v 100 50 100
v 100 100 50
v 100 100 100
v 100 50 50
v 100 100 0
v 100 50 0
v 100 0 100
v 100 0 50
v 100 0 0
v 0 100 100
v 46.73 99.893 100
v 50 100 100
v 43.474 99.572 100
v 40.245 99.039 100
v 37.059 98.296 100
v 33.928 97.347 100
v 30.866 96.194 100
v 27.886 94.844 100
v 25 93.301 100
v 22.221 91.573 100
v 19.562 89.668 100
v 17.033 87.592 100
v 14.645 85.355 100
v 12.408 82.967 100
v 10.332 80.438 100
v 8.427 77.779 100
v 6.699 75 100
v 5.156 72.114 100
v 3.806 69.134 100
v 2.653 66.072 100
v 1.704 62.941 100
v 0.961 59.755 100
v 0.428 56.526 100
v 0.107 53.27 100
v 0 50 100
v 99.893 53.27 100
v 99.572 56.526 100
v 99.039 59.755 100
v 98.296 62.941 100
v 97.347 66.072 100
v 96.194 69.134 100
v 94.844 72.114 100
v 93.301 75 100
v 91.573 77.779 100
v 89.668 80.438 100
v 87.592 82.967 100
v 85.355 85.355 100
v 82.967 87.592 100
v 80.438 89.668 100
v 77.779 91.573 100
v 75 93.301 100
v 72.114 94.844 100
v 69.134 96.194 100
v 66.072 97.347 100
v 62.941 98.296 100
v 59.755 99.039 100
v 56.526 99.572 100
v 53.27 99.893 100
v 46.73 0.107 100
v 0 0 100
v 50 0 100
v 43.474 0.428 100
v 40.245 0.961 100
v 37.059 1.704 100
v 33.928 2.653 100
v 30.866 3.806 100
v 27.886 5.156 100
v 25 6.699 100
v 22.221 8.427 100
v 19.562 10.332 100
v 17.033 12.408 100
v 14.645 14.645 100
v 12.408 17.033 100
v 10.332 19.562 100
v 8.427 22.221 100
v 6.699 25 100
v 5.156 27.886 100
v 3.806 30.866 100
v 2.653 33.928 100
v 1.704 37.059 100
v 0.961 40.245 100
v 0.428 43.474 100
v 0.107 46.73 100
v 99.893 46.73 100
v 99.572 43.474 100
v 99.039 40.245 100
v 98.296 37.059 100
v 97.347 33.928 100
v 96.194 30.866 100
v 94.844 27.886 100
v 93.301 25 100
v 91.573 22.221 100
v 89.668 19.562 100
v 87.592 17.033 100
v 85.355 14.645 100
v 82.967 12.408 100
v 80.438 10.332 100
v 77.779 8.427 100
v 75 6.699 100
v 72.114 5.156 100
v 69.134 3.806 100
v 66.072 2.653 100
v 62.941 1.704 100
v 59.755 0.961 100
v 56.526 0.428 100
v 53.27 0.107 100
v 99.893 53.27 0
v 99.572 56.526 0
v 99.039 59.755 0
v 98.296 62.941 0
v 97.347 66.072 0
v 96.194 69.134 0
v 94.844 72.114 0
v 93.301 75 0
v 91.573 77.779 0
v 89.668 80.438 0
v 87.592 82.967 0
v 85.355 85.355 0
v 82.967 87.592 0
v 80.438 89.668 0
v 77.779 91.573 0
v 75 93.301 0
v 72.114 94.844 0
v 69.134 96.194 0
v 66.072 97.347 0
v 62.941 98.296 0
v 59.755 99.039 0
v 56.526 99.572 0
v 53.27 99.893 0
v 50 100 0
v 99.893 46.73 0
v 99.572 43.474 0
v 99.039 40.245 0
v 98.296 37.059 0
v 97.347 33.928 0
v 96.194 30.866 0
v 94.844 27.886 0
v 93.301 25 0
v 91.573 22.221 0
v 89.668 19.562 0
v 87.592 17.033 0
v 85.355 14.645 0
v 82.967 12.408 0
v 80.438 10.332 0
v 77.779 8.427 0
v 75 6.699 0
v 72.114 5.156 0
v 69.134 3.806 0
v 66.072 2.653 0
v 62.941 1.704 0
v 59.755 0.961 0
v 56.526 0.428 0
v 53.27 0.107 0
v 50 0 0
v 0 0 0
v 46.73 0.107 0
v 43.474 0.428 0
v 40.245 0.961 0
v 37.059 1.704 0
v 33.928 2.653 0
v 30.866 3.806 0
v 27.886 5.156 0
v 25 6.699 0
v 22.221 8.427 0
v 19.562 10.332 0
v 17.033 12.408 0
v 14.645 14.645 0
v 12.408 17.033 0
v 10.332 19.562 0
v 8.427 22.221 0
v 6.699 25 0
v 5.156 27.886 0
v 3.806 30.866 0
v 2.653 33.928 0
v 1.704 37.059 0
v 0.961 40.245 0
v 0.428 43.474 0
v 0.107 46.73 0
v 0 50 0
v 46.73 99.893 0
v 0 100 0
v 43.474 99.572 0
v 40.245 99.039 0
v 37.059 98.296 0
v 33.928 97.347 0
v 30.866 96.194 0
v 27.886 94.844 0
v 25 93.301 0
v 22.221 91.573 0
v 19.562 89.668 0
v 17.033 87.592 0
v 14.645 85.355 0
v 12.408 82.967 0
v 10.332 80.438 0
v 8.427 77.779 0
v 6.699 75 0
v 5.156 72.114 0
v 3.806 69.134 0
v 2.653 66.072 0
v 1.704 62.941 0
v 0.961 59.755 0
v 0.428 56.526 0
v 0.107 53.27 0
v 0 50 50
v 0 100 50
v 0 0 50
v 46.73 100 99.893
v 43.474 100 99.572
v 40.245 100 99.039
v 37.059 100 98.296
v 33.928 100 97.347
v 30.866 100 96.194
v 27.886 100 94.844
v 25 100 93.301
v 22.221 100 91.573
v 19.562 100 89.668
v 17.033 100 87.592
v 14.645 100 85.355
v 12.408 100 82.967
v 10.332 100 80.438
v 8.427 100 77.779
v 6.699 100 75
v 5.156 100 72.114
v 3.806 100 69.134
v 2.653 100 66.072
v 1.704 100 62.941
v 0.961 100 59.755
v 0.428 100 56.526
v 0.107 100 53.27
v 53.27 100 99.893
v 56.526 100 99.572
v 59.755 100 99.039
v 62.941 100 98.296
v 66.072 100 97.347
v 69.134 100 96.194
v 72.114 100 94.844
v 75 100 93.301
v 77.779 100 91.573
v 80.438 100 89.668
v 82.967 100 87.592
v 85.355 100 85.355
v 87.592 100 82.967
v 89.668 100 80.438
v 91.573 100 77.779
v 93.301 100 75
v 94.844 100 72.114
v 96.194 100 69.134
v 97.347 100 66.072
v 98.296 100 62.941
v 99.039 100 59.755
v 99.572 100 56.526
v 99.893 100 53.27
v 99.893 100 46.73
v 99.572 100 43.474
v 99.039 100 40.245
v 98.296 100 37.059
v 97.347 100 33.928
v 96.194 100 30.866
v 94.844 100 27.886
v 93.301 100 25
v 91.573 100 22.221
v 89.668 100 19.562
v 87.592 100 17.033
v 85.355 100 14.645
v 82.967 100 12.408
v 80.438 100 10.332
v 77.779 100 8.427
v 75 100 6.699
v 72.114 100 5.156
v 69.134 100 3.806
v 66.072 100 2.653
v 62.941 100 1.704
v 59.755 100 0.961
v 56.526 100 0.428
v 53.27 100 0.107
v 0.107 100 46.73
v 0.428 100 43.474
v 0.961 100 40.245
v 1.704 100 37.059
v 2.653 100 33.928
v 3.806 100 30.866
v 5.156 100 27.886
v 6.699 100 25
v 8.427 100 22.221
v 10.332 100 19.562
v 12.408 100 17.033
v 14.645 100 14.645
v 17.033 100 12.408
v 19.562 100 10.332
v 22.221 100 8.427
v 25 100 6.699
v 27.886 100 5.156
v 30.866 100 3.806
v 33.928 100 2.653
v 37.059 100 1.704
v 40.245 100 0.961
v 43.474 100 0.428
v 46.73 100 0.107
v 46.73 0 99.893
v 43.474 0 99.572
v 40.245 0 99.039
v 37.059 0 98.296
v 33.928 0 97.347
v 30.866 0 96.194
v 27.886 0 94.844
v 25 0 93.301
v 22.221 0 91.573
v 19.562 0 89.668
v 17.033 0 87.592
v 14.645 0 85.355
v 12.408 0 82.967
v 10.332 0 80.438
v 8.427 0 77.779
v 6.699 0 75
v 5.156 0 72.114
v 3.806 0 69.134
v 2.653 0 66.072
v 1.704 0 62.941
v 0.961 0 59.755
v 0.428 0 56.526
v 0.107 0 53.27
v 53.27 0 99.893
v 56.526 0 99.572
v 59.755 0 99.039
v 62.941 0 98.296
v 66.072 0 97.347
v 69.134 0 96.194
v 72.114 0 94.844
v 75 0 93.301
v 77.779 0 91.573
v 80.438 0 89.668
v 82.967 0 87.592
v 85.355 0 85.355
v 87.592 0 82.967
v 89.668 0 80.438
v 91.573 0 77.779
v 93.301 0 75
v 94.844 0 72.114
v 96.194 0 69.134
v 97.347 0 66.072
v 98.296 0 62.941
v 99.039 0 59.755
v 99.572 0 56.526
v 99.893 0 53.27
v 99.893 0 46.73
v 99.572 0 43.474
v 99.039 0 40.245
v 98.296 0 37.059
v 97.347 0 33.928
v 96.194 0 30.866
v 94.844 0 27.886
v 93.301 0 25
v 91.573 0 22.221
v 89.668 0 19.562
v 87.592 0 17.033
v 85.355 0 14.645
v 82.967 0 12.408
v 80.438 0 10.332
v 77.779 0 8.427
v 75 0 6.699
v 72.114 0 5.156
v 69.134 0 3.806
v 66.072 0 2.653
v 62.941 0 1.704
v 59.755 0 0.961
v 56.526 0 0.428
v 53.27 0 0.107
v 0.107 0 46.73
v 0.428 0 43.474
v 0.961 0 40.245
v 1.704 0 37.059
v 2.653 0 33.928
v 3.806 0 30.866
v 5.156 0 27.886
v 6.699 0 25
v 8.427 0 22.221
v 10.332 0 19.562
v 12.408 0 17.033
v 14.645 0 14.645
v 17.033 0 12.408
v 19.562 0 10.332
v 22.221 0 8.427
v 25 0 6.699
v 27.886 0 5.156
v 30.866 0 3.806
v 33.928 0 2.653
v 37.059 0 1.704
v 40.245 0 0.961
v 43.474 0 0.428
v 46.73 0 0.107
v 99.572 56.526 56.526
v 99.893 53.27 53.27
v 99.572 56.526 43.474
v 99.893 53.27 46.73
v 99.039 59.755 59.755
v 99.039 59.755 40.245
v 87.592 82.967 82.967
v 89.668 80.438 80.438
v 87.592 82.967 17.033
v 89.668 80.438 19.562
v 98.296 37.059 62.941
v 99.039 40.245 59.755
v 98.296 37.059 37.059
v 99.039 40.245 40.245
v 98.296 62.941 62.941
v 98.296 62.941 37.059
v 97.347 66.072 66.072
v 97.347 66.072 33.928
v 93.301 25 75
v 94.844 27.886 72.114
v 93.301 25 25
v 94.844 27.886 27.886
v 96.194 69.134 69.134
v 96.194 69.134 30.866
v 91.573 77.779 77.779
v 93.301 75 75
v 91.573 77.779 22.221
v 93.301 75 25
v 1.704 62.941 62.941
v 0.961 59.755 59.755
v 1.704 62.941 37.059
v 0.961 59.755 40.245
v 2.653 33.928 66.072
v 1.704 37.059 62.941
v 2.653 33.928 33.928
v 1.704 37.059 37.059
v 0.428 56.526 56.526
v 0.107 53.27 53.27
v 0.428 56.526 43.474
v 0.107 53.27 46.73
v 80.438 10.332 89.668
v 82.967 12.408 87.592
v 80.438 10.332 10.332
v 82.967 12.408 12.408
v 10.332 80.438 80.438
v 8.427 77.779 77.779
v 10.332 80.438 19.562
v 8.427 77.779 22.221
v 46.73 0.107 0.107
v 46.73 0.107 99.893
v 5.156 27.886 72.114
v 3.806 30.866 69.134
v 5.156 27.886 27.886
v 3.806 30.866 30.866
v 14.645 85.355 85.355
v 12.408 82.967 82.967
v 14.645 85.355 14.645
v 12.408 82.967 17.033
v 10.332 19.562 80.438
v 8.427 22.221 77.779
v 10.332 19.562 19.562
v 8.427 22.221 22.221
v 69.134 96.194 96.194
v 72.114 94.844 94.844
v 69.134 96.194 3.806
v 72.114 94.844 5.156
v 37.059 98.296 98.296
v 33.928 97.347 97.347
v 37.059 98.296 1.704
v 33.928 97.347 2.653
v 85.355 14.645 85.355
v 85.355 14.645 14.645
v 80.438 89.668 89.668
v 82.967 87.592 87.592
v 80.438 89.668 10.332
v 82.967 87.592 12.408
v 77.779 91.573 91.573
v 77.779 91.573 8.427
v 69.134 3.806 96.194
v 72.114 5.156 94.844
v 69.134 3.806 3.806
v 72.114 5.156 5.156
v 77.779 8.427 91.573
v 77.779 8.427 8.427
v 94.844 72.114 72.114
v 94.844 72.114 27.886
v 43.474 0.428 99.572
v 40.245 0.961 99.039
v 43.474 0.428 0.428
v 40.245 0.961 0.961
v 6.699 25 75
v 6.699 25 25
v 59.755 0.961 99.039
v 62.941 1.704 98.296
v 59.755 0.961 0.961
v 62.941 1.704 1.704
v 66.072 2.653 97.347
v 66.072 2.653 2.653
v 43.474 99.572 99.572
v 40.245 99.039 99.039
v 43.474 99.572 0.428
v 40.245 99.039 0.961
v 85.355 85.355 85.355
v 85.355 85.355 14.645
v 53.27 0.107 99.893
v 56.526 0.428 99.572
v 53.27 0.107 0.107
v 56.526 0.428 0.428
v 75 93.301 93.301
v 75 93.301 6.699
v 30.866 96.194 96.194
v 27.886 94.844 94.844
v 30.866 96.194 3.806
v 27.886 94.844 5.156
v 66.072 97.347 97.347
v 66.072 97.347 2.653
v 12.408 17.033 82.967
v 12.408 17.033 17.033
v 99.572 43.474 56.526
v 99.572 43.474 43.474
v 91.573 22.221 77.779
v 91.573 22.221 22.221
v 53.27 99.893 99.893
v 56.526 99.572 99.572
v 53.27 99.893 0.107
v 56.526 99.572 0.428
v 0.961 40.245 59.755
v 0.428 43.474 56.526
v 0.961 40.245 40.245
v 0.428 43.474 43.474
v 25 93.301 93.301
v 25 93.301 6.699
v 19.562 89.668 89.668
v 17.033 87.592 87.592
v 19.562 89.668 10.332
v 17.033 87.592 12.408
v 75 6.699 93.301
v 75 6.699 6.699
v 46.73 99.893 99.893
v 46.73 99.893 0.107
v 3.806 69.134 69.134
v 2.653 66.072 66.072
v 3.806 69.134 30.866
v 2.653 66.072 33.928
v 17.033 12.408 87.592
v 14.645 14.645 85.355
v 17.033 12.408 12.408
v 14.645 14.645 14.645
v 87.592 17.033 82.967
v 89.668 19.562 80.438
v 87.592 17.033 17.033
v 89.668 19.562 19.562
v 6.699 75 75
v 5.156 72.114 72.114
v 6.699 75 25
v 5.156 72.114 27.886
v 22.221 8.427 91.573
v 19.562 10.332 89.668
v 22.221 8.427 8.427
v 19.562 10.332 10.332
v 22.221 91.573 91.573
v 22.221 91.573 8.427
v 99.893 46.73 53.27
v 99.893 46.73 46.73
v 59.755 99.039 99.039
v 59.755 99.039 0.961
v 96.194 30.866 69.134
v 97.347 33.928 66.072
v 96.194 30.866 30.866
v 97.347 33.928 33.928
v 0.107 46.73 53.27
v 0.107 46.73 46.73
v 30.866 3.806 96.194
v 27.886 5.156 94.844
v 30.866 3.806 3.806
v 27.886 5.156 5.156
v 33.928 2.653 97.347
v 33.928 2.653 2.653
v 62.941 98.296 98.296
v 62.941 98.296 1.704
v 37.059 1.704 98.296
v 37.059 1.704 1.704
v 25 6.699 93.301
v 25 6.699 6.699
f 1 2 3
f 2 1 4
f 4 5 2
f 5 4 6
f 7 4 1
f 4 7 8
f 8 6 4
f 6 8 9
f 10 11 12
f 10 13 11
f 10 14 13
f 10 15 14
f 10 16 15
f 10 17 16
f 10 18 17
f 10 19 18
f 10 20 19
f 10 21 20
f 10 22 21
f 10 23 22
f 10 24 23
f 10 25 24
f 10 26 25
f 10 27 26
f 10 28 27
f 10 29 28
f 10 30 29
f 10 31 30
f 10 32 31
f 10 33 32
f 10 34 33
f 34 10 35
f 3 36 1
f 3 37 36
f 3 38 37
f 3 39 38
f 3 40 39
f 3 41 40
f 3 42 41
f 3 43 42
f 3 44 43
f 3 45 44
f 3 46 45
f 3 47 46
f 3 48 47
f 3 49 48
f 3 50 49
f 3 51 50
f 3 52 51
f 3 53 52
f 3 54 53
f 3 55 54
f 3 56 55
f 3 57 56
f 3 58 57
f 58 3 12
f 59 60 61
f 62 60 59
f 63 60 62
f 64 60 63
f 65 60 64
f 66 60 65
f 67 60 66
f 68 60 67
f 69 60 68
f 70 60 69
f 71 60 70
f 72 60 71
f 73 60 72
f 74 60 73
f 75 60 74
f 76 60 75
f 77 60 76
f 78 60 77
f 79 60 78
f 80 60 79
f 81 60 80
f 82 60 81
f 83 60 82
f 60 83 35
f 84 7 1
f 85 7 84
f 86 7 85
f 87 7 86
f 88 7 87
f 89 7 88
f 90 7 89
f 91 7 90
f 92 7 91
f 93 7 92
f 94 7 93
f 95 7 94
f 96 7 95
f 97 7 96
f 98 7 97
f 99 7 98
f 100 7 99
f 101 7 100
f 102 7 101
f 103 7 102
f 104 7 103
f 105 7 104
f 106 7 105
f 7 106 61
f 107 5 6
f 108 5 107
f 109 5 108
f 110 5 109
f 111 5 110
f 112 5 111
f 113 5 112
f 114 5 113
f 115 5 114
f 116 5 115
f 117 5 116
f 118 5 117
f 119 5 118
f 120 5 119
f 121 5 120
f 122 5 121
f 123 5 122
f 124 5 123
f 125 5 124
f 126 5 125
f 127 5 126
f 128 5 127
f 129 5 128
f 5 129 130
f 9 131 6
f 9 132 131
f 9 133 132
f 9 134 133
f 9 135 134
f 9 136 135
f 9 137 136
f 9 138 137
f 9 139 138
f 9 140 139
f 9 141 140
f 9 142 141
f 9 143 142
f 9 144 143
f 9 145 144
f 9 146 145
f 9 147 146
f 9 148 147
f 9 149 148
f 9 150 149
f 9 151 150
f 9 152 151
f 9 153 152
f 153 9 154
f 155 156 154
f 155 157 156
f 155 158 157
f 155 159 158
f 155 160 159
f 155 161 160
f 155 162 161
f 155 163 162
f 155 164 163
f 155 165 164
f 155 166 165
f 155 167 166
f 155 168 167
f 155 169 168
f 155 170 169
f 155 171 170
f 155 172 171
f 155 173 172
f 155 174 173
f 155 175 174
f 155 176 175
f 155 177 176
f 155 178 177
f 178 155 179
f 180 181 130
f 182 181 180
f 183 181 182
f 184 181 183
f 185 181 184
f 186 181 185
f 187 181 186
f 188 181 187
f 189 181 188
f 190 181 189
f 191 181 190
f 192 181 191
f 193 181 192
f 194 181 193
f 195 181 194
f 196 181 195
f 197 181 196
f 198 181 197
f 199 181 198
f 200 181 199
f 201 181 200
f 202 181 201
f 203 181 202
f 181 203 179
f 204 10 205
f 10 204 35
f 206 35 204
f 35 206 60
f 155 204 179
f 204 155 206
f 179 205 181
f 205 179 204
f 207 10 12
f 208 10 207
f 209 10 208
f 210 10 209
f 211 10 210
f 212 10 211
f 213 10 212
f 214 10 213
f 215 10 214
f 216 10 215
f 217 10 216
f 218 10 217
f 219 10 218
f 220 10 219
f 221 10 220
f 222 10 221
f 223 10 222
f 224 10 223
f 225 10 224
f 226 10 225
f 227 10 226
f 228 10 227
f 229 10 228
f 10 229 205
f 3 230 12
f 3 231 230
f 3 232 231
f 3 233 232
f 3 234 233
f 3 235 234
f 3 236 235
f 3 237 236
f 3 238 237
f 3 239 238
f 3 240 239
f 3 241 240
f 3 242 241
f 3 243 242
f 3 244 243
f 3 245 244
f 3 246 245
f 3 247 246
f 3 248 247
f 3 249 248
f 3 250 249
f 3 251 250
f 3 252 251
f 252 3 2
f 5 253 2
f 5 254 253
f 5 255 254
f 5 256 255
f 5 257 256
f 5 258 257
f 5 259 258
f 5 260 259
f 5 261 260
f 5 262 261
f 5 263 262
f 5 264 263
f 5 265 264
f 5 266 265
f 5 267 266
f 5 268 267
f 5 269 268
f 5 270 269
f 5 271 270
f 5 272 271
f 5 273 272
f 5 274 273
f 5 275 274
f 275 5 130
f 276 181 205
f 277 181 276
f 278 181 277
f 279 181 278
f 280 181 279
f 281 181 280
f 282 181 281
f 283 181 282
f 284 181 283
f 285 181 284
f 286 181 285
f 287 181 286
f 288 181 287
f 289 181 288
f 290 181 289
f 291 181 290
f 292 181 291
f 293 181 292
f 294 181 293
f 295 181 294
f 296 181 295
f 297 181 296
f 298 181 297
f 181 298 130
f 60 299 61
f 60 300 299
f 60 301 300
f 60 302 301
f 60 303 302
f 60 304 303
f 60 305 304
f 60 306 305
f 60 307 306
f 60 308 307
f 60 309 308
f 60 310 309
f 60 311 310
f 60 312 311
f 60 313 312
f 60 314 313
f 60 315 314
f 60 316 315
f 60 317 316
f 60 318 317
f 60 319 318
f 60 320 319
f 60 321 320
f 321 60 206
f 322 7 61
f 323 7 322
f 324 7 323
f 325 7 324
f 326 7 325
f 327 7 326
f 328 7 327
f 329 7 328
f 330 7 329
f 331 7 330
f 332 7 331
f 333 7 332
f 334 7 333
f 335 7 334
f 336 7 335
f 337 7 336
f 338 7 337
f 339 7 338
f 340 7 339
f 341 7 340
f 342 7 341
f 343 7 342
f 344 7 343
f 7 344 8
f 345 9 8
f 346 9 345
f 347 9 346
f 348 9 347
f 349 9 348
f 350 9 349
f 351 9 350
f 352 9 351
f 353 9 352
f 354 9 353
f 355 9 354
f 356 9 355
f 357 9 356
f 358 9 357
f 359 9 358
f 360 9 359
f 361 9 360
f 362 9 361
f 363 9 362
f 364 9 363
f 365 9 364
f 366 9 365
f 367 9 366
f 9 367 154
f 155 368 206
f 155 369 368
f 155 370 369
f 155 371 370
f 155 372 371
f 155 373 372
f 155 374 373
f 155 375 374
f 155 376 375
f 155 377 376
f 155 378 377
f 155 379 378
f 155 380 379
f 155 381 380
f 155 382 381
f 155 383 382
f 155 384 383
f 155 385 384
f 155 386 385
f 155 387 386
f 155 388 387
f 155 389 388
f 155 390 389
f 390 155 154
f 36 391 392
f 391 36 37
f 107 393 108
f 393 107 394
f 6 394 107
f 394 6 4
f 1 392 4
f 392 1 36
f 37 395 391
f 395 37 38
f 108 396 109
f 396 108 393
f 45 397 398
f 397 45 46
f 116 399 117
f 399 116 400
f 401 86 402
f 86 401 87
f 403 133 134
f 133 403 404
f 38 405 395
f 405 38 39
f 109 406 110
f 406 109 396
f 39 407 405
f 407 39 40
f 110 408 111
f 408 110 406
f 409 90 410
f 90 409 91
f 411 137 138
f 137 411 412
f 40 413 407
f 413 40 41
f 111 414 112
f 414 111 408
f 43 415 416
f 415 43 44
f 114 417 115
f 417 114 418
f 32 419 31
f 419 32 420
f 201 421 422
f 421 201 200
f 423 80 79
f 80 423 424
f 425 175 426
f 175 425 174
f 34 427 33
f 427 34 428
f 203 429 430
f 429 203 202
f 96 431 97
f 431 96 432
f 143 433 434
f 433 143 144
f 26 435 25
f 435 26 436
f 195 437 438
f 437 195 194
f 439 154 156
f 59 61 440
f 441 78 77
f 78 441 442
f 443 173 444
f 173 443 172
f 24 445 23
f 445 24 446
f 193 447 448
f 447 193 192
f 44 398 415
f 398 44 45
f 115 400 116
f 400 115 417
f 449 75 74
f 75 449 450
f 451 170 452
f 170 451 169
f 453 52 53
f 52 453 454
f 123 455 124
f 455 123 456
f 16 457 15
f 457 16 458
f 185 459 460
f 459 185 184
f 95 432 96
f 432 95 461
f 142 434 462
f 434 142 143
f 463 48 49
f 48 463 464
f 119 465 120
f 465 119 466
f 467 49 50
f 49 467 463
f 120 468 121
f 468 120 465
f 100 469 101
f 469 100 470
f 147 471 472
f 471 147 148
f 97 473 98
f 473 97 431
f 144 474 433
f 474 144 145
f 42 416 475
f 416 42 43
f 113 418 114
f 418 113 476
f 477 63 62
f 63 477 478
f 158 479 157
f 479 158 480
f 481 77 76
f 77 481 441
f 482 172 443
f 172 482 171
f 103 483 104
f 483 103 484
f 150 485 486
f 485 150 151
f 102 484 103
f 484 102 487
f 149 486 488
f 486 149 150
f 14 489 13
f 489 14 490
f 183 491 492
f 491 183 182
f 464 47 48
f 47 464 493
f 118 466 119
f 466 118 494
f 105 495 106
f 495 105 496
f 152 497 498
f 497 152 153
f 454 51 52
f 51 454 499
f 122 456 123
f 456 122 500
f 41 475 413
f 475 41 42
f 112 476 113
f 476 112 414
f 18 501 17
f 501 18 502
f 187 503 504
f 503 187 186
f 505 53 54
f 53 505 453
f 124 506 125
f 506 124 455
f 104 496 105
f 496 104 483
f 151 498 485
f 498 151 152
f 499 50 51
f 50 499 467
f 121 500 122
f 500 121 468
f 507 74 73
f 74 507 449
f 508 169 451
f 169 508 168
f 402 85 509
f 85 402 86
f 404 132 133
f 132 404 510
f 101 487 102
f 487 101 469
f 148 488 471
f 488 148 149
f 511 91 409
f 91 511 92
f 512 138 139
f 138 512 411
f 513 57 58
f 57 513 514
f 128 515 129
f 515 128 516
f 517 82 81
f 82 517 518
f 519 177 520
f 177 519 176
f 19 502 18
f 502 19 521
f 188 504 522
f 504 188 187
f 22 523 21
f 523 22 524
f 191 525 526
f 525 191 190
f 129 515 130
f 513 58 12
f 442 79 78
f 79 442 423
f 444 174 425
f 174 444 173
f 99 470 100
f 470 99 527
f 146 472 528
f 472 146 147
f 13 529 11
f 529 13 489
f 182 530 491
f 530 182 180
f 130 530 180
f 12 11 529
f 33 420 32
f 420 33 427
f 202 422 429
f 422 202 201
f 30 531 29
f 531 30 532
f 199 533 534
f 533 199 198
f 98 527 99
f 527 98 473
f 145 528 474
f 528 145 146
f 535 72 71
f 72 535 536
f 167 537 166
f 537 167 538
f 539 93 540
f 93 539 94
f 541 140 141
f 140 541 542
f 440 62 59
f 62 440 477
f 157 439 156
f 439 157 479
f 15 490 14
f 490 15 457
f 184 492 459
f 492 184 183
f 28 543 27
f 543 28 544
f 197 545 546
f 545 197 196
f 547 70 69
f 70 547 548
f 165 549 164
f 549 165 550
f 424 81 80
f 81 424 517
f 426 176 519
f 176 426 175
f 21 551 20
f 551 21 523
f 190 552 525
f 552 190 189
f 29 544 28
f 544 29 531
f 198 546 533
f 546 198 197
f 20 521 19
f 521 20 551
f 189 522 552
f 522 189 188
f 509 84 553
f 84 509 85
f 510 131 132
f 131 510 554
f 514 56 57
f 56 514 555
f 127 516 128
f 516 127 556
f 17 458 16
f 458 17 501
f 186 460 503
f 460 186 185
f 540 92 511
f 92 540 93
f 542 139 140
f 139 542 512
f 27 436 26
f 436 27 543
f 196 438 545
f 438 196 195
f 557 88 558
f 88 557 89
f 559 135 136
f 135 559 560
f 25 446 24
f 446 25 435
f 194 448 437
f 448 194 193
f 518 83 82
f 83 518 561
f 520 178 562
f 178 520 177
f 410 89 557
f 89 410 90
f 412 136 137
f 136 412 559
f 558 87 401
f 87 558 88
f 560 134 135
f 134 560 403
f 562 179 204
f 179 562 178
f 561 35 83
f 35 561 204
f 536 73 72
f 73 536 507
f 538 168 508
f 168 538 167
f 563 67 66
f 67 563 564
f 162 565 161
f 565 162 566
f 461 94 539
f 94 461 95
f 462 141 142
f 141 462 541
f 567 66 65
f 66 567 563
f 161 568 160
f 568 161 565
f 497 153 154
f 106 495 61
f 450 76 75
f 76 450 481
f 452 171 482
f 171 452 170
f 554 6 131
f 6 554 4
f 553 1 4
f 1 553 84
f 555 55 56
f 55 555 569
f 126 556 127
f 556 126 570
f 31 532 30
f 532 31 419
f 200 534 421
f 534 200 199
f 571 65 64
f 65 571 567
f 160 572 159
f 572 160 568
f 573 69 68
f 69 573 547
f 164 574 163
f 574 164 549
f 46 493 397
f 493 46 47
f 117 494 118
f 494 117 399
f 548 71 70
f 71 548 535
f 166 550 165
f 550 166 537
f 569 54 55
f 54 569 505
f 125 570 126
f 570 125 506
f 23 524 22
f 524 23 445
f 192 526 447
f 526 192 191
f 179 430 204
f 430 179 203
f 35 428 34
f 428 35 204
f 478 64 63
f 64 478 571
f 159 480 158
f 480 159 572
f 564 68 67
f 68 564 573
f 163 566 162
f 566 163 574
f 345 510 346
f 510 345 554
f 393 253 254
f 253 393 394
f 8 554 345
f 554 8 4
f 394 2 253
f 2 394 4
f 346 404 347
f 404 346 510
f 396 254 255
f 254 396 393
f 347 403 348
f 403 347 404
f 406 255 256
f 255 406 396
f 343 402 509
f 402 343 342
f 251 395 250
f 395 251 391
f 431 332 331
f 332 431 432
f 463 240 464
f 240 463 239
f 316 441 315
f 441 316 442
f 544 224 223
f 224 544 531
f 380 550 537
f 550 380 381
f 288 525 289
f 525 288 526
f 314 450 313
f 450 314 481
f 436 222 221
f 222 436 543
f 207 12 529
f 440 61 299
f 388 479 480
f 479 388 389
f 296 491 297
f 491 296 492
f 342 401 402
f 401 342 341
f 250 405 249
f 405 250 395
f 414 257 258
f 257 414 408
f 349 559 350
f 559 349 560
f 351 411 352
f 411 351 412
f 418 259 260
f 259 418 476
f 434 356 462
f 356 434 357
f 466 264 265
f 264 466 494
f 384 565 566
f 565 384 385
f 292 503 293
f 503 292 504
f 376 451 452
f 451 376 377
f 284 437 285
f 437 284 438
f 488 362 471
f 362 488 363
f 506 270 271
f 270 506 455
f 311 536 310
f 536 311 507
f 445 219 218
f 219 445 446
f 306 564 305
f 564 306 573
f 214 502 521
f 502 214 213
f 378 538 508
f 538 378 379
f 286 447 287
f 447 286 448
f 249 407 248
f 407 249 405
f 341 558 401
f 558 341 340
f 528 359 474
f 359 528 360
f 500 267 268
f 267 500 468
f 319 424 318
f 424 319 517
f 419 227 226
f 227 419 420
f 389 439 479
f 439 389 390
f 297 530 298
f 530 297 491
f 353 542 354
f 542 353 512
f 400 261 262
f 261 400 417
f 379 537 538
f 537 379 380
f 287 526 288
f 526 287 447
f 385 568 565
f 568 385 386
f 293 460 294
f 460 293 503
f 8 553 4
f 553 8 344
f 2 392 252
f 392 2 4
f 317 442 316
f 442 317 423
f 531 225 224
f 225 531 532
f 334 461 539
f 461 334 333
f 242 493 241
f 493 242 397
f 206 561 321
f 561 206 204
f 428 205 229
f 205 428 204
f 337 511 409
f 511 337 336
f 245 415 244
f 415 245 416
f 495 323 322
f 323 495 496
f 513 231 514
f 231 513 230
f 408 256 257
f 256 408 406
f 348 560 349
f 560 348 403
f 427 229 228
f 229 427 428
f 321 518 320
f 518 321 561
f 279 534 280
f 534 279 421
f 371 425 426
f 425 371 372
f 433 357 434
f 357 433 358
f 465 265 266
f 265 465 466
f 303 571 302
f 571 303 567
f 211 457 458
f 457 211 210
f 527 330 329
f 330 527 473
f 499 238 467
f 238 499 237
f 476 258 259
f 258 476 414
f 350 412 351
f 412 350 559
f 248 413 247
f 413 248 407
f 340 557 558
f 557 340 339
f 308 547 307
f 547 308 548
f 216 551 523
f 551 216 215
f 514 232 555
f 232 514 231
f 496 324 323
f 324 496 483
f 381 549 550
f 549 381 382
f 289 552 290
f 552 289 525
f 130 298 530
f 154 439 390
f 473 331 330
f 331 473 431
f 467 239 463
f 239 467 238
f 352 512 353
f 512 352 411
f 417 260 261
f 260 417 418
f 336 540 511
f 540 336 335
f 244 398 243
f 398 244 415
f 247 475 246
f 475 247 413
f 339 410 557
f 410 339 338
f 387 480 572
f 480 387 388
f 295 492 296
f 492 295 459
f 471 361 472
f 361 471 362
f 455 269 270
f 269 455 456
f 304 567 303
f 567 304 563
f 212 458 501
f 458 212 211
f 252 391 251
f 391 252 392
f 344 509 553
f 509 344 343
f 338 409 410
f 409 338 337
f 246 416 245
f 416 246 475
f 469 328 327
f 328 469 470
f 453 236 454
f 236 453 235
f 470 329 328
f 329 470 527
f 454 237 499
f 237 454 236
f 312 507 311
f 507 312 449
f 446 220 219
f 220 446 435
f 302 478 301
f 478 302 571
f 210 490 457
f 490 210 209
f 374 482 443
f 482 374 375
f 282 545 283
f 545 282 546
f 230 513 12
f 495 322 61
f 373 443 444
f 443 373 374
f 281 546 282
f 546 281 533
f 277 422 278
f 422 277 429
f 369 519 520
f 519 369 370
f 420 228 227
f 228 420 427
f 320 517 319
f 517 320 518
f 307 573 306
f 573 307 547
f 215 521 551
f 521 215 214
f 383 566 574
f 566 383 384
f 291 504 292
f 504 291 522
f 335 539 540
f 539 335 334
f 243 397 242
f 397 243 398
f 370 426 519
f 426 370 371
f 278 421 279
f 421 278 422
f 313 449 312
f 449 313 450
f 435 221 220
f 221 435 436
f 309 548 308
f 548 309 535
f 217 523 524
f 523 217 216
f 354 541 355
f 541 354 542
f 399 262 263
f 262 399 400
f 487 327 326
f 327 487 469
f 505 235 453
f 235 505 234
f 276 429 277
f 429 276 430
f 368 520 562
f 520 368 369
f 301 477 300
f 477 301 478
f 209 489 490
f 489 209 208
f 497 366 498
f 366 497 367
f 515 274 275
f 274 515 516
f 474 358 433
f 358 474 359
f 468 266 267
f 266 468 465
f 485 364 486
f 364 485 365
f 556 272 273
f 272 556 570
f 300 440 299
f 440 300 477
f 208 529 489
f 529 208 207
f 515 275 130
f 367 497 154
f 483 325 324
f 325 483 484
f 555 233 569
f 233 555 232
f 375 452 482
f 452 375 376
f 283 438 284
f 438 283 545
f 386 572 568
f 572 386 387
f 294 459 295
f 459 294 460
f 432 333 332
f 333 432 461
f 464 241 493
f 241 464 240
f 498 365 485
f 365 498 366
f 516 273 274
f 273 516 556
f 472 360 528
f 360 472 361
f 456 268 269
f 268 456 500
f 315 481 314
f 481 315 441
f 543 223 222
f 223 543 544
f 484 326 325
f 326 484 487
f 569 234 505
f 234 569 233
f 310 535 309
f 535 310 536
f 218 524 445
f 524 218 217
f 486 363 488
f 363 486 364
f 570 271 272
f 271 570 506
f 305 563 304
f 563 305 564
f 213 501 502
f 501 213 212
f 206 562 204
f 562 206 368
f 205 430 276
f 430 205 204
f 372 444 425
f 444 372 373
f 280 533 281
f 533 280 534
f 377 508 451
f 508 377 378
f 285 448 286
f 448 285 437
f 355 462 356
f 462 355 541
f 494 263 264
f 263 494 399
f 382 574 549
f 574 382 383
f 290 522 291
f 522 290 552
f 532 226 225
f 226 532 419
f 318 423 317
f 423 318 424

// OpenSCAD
// Two perpendicular cylindrical cuts through a cube.
//
// A deliberate stress test for the CSG reader: cuts here are cylinders, not boxes, and the
// resulting surfaces are curved, so there is no crease along them and nothing for an
// angle-threshold edge rule to find. The radius equals half the side, so each cylinder just
// touches all four walls it passes between.

$fn = 96;

side = 100;
r    = side / 2;
over = 2;          // so the cuts pass cleanly through, leaving no skin

// @group Cube
    // @name Drilled cube
    difference() {
        cube([side, side, side]);

        // Vertical, through the centre.
        translate([side / 2, side / 2, -over / 2])
            cylinder(h = side + over, r = r);

        // Horizontal, perpendicular to the first, through the centre.
        translate([side / 2, -over / 2, side / 2])
            rotate([-90, 0, 0])
                cylinder(h = side + over, r = r);
    }
// @endgroup
